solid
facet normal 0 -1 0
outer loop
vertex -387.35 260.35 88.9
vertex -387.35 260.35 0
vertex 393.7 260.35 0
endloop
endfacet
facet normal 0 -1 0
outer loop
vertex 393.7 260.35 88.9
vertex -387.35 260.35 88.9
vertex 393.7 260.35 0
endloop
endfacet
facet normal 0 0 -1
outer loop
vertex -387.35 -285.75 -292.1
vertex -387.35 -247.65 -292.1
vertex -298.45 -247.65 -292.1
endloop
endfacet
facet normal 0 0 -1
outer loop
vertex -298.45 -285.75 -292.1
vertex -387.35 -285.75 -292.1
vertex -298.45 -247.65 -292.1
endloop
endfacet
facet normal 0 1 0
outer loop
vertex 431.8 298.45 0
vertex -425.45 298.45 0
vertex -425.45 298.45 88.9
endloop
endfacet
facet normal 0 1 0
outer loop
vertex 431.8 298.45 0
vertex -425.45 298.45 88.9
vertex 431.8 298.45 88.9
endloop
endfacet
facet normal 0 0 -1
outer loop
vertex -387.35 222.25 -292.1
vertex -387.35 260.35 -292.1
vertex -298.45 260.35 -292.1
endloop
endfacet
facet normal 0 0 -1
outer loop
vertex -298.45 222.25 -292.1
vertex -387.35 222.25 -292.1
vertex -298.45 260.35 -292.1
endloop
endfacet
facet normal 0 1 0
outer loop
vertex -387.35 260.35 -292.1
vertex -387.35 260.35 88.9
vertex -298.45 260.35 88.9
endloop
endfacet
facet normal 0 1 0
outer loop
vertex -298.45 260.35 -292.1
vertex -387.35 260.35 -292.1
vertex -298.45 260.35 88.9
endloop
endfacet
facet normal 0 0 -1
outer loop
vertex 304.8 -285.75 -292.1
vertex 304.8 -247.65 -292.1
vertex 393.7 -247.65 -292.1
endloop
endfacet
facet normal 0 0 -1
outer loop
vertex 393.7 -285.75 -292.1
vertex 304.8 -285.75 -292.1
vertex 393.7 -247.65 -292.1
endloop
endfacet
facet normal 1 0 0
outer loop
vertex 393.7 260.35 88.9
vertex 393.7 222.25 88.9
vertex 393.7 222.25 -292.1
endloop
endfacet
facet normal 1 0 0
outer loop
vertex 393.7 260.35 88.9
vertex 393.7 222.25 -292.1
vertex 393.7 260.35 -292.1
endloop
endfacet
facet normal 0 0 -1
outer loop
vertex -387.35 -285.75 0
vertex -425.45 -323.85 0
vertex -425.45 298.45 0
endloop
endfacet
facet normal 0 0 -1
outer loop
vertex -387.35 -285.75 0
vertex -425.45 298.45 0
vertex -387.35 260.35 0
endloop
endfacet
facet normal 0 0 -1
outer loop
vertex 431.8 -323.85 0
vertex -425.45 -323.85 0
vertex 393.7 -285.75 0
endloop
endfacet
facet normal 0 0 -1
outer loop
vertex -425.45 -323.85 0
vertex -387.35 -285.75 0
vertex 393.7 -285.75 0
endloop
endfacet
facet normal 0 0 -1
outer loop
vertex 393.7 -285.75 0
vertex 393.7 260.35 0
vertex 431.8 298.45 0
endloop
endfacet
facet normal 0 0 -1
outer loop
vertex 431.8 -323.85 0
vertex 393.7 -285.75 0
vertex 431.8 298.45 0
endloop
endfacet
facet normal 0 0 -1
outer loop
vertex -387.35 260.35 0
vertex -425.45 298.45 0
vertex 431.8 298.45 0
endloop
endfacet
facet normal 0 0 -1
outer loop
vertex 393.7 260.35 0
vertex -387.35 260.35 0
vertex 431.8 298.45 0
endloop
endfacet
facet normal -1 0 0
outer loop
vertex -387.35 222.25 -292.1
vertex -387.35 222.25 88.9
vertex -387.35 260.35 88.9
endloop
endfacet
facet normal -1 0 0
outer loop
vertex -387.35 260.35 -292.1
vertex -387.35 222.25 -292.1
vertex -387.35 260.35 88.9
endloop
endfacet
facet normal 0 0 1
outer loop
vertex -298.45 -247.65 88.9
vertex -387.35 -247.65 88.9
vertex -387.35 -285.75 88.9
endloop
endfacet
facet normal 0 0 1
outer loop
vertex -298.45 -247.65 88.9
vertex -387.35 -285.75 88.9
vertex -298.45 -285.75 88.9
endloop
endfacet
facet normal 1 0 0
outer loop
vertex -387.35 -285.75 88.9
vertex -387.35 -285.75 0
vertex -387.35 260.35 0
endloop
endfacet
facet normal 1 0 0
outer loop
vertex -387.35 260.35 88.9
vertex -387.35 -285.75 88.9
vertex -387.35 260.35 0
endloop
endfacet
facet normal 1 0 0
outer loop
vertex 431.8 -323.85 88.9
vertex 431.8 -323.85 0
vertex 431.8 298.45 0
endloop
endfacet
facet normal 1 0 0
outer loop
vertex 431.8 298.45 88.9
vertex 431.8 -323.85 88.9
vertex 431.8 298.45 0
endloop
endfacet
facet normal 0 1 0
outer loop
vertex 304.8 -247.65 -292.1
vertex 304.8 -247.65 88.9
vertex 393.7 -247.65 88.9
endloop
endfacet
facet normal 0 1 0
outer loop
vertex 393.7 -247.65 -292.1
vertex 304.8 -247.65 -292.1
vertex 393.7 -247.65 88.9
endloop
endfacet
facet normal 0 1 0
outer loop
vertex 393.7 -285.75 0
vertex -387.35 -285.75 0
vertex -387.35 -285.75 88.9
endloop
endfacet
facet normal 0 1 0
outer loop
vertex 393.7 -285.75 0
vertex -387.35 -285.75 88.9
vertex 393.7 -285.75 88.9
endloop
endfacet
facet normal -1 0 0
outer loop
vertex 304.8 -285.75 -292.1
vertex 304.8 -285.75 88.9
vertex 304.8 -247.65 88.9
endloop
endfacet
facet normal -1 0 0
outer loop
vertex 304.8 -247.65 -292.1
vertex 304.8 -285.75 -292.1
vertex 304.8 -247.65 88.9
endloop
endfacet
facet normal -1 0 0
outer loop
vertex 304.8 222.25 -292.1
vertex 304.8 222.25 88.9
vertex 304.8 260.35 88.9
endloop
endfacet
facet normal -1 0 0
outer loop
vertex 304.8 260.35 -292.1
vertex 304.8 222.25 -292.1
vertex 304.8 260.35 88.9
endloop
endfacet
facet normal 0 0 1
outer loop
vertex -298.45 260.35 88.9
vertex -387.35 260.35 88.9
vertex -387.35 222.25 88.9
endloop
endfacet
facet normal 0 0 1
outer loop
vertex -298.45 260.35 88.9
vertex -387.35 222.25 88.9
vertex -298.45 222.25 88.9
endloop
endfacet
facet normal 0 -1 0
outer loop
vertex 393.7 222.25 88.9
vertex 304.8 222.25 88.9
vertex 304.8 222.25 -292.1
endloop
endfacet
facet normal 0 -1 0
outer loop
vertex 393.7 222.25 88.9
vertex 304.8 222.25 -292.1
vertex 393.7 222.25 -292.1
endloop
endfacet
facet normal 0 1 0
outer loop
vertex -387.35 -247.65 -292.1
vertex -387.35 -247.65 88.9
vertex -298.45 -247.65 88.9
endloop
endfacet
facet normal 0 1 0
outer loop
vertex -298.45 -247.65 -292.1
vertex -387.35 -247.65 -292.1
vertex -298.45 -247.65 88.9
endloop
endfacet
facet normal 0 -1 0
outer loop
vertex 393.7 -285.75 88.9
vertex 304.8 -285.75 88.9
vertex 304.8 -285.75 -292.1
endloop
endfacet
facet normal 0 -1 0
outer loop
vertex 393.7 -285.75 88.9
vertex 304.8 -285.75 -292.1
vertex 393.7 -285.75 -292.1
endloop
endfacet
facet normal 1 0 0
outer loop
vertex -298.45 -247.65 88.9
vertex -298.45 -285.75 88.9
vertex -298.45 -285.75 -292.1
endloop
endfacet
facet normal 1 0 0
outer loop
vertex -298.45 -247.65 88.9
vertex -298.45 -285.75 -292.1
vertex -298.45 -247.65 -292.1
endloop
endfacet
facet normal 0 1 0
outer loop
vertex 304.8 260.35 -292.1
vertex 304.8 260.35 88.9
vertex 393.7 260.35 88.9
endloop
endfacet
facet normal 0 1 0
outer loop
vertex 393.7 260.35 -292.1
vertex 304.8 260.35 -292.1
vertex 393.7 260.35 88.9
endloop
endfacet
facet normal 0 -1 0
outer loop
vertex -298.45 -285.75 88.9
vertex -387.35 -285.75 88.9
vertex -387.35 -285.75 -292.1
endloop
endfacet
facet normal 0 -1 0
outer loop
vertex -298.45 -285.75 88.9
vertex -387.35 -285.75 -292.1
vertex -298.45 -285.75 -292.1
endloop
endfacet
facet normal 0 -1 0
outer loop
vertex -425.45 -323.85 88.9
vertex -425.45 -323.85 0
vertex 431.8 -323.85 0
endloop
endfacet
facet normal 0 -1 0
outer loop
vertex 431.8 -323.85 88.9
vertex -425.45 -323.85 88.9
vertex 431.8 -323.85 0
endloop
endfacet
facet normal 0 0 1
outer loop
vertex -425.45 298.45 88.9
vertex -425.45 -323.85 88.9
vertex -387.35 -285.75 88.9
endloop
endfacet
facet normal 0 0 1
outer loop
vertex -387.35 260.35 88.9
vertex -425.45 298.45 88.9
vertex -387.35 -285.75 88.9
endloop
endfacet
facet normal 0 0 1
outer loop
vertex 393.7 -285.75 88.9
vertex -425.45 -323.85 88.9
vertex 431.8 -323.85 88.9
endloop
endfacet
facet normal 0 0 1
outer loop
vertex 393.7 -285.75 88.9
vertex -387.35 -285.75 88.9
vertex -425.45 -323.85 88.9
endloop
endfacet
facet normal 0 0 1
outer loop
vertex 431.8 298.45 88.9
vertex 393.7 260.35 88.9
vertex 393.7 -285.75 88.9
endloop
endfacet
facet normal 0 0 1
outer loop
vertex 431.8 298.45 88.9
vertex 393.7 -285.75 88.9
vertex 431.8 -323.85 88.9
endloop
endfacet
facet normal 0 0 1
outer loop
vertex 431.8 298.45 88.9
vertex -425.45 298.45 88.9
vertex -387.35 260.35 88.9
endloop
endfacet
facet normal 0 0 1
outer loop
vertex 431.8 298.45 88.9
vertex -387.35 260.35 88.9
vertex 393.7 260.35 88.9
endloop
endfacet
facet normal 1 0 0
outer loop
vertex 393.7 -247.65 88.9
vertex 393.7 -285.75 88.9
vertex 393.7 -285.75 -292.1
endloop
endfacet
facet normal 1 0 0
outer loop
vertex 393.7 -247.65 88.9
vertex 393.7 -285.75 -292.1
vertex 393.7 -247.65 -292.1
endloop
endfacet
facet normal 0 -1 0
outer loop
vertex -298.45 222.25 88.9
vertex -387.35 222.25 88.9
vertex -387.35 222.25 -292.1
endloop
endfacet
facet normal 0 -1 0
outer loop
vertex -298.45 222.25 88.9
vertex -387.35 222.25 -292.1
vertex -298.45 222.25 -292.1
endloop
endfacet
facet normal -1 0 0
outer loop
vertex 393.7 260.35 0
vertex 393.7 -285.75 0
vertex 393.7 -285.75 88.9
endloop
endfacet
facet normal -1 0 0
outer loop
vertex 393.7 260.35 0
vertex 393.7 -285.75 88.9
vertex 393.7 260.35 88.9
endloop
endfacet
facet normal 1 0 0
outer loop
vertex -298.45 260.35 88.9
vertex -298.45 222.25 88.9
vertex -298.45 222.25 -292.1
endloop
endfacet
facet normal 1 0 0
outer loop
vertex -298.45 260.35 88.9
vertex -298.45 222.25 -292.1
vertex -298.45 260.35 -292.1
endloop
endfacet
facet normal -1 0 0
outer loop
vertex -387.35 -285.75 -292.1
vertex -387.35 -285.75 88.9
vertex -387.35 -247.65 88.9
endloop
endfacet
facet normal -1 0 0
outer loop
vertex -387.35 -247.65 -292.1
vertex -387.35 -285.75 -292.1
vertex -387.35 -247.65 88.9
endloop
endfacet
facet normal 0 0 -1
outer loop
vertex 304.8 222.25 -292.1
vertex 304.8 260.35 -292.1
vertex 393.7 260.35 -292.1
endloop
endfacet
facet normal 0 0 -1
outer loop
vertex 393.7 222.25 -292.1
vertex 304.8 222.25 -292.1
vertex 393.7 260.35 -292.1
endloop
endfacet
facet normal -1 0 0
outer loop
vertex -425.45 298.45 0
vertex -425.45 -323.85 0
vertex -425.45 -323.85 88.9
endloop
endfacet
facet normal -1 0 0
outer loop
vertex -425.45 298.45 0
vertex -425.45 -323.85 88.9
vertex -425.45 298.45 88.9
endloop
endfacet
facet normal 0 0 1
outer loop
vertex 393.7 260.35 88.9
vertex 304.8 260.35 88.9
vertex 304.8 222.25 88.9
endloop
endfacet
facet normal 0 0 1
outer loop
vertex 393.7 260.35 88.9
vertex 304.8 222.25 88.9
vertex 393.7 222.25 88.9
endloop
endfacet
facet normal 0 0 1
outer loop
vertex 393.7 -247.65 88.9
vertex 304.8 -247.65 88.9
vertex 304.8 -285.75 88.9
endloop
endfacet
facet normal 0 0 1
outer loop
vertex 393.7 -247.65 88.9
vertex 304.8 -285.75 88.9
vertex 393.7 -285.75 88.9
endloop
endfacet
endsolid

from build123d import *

# Parameters (mm, degrees)
F0_W     = 857.25
F0_H     = 622.3
F0_W_2   = 781.05
F0_H_2   = 546.1
F1_DEPTH = 88.9
F2_W     = 88.9
F2_H     = 38.1
F3_DEPTH = 381


with BuildPart() as f1:
    # F0 (on Top) → F1 (new body)
    with BuildSketch(Plane.XY):
        with Locations((3.175, -12.7)):
            Rectangle(F0_W, F0_H)
        with Locations((3.175, -12.7)):
            Rectangle(F0_W_2, F0_H_2, mode=Mode.SUBTRACT)
    extrude(amount=F1_DEPTH)


with BuildPart() as f3:
    # F2 (on face) → F3 (new body)
    with BuildSketch(Plane.XY.offset(88.9)):
        with Locations((-342.9, 241.3)):
            Rectangle(F2_W, F2_H)
    extrude(amount=-F3_DEPTH)


with BuildPart() as f3b:
    # F2 (on face) → F3, piece 2 (new body)
    with BuildSketch(Plane.XY.offset(88.9)):
        with Locations((-342.9, -266.7)):
            Rectangle(F2_W, F2_H)
    extrude(amount=-F3_DEPTH)


with BuildPart() as f3c:
    # F2 (on face) → F3, piece 3 (new body)
    with BuildSketch(Plane.XY.offset(88.9)):
        with Locations((349.25, -266.7)):
            Rectangle(F2_W, F2_H)
    extrude(amount=-F3_DEPTH)


with BuildPart() as f3d:
    # F2 (on face) → F3, piece 4 (new body)
    with BuildSketch(Plane.XY.offset(88.9)):
        with Locations((349.25, 241.3)):
            Rectangle(F2_W, F2_H)
    extrude(amount=-F3_DEPTH)


solid = Compound([f1.part, f3.part, f3b.part, f3c.part, f3d.part])
